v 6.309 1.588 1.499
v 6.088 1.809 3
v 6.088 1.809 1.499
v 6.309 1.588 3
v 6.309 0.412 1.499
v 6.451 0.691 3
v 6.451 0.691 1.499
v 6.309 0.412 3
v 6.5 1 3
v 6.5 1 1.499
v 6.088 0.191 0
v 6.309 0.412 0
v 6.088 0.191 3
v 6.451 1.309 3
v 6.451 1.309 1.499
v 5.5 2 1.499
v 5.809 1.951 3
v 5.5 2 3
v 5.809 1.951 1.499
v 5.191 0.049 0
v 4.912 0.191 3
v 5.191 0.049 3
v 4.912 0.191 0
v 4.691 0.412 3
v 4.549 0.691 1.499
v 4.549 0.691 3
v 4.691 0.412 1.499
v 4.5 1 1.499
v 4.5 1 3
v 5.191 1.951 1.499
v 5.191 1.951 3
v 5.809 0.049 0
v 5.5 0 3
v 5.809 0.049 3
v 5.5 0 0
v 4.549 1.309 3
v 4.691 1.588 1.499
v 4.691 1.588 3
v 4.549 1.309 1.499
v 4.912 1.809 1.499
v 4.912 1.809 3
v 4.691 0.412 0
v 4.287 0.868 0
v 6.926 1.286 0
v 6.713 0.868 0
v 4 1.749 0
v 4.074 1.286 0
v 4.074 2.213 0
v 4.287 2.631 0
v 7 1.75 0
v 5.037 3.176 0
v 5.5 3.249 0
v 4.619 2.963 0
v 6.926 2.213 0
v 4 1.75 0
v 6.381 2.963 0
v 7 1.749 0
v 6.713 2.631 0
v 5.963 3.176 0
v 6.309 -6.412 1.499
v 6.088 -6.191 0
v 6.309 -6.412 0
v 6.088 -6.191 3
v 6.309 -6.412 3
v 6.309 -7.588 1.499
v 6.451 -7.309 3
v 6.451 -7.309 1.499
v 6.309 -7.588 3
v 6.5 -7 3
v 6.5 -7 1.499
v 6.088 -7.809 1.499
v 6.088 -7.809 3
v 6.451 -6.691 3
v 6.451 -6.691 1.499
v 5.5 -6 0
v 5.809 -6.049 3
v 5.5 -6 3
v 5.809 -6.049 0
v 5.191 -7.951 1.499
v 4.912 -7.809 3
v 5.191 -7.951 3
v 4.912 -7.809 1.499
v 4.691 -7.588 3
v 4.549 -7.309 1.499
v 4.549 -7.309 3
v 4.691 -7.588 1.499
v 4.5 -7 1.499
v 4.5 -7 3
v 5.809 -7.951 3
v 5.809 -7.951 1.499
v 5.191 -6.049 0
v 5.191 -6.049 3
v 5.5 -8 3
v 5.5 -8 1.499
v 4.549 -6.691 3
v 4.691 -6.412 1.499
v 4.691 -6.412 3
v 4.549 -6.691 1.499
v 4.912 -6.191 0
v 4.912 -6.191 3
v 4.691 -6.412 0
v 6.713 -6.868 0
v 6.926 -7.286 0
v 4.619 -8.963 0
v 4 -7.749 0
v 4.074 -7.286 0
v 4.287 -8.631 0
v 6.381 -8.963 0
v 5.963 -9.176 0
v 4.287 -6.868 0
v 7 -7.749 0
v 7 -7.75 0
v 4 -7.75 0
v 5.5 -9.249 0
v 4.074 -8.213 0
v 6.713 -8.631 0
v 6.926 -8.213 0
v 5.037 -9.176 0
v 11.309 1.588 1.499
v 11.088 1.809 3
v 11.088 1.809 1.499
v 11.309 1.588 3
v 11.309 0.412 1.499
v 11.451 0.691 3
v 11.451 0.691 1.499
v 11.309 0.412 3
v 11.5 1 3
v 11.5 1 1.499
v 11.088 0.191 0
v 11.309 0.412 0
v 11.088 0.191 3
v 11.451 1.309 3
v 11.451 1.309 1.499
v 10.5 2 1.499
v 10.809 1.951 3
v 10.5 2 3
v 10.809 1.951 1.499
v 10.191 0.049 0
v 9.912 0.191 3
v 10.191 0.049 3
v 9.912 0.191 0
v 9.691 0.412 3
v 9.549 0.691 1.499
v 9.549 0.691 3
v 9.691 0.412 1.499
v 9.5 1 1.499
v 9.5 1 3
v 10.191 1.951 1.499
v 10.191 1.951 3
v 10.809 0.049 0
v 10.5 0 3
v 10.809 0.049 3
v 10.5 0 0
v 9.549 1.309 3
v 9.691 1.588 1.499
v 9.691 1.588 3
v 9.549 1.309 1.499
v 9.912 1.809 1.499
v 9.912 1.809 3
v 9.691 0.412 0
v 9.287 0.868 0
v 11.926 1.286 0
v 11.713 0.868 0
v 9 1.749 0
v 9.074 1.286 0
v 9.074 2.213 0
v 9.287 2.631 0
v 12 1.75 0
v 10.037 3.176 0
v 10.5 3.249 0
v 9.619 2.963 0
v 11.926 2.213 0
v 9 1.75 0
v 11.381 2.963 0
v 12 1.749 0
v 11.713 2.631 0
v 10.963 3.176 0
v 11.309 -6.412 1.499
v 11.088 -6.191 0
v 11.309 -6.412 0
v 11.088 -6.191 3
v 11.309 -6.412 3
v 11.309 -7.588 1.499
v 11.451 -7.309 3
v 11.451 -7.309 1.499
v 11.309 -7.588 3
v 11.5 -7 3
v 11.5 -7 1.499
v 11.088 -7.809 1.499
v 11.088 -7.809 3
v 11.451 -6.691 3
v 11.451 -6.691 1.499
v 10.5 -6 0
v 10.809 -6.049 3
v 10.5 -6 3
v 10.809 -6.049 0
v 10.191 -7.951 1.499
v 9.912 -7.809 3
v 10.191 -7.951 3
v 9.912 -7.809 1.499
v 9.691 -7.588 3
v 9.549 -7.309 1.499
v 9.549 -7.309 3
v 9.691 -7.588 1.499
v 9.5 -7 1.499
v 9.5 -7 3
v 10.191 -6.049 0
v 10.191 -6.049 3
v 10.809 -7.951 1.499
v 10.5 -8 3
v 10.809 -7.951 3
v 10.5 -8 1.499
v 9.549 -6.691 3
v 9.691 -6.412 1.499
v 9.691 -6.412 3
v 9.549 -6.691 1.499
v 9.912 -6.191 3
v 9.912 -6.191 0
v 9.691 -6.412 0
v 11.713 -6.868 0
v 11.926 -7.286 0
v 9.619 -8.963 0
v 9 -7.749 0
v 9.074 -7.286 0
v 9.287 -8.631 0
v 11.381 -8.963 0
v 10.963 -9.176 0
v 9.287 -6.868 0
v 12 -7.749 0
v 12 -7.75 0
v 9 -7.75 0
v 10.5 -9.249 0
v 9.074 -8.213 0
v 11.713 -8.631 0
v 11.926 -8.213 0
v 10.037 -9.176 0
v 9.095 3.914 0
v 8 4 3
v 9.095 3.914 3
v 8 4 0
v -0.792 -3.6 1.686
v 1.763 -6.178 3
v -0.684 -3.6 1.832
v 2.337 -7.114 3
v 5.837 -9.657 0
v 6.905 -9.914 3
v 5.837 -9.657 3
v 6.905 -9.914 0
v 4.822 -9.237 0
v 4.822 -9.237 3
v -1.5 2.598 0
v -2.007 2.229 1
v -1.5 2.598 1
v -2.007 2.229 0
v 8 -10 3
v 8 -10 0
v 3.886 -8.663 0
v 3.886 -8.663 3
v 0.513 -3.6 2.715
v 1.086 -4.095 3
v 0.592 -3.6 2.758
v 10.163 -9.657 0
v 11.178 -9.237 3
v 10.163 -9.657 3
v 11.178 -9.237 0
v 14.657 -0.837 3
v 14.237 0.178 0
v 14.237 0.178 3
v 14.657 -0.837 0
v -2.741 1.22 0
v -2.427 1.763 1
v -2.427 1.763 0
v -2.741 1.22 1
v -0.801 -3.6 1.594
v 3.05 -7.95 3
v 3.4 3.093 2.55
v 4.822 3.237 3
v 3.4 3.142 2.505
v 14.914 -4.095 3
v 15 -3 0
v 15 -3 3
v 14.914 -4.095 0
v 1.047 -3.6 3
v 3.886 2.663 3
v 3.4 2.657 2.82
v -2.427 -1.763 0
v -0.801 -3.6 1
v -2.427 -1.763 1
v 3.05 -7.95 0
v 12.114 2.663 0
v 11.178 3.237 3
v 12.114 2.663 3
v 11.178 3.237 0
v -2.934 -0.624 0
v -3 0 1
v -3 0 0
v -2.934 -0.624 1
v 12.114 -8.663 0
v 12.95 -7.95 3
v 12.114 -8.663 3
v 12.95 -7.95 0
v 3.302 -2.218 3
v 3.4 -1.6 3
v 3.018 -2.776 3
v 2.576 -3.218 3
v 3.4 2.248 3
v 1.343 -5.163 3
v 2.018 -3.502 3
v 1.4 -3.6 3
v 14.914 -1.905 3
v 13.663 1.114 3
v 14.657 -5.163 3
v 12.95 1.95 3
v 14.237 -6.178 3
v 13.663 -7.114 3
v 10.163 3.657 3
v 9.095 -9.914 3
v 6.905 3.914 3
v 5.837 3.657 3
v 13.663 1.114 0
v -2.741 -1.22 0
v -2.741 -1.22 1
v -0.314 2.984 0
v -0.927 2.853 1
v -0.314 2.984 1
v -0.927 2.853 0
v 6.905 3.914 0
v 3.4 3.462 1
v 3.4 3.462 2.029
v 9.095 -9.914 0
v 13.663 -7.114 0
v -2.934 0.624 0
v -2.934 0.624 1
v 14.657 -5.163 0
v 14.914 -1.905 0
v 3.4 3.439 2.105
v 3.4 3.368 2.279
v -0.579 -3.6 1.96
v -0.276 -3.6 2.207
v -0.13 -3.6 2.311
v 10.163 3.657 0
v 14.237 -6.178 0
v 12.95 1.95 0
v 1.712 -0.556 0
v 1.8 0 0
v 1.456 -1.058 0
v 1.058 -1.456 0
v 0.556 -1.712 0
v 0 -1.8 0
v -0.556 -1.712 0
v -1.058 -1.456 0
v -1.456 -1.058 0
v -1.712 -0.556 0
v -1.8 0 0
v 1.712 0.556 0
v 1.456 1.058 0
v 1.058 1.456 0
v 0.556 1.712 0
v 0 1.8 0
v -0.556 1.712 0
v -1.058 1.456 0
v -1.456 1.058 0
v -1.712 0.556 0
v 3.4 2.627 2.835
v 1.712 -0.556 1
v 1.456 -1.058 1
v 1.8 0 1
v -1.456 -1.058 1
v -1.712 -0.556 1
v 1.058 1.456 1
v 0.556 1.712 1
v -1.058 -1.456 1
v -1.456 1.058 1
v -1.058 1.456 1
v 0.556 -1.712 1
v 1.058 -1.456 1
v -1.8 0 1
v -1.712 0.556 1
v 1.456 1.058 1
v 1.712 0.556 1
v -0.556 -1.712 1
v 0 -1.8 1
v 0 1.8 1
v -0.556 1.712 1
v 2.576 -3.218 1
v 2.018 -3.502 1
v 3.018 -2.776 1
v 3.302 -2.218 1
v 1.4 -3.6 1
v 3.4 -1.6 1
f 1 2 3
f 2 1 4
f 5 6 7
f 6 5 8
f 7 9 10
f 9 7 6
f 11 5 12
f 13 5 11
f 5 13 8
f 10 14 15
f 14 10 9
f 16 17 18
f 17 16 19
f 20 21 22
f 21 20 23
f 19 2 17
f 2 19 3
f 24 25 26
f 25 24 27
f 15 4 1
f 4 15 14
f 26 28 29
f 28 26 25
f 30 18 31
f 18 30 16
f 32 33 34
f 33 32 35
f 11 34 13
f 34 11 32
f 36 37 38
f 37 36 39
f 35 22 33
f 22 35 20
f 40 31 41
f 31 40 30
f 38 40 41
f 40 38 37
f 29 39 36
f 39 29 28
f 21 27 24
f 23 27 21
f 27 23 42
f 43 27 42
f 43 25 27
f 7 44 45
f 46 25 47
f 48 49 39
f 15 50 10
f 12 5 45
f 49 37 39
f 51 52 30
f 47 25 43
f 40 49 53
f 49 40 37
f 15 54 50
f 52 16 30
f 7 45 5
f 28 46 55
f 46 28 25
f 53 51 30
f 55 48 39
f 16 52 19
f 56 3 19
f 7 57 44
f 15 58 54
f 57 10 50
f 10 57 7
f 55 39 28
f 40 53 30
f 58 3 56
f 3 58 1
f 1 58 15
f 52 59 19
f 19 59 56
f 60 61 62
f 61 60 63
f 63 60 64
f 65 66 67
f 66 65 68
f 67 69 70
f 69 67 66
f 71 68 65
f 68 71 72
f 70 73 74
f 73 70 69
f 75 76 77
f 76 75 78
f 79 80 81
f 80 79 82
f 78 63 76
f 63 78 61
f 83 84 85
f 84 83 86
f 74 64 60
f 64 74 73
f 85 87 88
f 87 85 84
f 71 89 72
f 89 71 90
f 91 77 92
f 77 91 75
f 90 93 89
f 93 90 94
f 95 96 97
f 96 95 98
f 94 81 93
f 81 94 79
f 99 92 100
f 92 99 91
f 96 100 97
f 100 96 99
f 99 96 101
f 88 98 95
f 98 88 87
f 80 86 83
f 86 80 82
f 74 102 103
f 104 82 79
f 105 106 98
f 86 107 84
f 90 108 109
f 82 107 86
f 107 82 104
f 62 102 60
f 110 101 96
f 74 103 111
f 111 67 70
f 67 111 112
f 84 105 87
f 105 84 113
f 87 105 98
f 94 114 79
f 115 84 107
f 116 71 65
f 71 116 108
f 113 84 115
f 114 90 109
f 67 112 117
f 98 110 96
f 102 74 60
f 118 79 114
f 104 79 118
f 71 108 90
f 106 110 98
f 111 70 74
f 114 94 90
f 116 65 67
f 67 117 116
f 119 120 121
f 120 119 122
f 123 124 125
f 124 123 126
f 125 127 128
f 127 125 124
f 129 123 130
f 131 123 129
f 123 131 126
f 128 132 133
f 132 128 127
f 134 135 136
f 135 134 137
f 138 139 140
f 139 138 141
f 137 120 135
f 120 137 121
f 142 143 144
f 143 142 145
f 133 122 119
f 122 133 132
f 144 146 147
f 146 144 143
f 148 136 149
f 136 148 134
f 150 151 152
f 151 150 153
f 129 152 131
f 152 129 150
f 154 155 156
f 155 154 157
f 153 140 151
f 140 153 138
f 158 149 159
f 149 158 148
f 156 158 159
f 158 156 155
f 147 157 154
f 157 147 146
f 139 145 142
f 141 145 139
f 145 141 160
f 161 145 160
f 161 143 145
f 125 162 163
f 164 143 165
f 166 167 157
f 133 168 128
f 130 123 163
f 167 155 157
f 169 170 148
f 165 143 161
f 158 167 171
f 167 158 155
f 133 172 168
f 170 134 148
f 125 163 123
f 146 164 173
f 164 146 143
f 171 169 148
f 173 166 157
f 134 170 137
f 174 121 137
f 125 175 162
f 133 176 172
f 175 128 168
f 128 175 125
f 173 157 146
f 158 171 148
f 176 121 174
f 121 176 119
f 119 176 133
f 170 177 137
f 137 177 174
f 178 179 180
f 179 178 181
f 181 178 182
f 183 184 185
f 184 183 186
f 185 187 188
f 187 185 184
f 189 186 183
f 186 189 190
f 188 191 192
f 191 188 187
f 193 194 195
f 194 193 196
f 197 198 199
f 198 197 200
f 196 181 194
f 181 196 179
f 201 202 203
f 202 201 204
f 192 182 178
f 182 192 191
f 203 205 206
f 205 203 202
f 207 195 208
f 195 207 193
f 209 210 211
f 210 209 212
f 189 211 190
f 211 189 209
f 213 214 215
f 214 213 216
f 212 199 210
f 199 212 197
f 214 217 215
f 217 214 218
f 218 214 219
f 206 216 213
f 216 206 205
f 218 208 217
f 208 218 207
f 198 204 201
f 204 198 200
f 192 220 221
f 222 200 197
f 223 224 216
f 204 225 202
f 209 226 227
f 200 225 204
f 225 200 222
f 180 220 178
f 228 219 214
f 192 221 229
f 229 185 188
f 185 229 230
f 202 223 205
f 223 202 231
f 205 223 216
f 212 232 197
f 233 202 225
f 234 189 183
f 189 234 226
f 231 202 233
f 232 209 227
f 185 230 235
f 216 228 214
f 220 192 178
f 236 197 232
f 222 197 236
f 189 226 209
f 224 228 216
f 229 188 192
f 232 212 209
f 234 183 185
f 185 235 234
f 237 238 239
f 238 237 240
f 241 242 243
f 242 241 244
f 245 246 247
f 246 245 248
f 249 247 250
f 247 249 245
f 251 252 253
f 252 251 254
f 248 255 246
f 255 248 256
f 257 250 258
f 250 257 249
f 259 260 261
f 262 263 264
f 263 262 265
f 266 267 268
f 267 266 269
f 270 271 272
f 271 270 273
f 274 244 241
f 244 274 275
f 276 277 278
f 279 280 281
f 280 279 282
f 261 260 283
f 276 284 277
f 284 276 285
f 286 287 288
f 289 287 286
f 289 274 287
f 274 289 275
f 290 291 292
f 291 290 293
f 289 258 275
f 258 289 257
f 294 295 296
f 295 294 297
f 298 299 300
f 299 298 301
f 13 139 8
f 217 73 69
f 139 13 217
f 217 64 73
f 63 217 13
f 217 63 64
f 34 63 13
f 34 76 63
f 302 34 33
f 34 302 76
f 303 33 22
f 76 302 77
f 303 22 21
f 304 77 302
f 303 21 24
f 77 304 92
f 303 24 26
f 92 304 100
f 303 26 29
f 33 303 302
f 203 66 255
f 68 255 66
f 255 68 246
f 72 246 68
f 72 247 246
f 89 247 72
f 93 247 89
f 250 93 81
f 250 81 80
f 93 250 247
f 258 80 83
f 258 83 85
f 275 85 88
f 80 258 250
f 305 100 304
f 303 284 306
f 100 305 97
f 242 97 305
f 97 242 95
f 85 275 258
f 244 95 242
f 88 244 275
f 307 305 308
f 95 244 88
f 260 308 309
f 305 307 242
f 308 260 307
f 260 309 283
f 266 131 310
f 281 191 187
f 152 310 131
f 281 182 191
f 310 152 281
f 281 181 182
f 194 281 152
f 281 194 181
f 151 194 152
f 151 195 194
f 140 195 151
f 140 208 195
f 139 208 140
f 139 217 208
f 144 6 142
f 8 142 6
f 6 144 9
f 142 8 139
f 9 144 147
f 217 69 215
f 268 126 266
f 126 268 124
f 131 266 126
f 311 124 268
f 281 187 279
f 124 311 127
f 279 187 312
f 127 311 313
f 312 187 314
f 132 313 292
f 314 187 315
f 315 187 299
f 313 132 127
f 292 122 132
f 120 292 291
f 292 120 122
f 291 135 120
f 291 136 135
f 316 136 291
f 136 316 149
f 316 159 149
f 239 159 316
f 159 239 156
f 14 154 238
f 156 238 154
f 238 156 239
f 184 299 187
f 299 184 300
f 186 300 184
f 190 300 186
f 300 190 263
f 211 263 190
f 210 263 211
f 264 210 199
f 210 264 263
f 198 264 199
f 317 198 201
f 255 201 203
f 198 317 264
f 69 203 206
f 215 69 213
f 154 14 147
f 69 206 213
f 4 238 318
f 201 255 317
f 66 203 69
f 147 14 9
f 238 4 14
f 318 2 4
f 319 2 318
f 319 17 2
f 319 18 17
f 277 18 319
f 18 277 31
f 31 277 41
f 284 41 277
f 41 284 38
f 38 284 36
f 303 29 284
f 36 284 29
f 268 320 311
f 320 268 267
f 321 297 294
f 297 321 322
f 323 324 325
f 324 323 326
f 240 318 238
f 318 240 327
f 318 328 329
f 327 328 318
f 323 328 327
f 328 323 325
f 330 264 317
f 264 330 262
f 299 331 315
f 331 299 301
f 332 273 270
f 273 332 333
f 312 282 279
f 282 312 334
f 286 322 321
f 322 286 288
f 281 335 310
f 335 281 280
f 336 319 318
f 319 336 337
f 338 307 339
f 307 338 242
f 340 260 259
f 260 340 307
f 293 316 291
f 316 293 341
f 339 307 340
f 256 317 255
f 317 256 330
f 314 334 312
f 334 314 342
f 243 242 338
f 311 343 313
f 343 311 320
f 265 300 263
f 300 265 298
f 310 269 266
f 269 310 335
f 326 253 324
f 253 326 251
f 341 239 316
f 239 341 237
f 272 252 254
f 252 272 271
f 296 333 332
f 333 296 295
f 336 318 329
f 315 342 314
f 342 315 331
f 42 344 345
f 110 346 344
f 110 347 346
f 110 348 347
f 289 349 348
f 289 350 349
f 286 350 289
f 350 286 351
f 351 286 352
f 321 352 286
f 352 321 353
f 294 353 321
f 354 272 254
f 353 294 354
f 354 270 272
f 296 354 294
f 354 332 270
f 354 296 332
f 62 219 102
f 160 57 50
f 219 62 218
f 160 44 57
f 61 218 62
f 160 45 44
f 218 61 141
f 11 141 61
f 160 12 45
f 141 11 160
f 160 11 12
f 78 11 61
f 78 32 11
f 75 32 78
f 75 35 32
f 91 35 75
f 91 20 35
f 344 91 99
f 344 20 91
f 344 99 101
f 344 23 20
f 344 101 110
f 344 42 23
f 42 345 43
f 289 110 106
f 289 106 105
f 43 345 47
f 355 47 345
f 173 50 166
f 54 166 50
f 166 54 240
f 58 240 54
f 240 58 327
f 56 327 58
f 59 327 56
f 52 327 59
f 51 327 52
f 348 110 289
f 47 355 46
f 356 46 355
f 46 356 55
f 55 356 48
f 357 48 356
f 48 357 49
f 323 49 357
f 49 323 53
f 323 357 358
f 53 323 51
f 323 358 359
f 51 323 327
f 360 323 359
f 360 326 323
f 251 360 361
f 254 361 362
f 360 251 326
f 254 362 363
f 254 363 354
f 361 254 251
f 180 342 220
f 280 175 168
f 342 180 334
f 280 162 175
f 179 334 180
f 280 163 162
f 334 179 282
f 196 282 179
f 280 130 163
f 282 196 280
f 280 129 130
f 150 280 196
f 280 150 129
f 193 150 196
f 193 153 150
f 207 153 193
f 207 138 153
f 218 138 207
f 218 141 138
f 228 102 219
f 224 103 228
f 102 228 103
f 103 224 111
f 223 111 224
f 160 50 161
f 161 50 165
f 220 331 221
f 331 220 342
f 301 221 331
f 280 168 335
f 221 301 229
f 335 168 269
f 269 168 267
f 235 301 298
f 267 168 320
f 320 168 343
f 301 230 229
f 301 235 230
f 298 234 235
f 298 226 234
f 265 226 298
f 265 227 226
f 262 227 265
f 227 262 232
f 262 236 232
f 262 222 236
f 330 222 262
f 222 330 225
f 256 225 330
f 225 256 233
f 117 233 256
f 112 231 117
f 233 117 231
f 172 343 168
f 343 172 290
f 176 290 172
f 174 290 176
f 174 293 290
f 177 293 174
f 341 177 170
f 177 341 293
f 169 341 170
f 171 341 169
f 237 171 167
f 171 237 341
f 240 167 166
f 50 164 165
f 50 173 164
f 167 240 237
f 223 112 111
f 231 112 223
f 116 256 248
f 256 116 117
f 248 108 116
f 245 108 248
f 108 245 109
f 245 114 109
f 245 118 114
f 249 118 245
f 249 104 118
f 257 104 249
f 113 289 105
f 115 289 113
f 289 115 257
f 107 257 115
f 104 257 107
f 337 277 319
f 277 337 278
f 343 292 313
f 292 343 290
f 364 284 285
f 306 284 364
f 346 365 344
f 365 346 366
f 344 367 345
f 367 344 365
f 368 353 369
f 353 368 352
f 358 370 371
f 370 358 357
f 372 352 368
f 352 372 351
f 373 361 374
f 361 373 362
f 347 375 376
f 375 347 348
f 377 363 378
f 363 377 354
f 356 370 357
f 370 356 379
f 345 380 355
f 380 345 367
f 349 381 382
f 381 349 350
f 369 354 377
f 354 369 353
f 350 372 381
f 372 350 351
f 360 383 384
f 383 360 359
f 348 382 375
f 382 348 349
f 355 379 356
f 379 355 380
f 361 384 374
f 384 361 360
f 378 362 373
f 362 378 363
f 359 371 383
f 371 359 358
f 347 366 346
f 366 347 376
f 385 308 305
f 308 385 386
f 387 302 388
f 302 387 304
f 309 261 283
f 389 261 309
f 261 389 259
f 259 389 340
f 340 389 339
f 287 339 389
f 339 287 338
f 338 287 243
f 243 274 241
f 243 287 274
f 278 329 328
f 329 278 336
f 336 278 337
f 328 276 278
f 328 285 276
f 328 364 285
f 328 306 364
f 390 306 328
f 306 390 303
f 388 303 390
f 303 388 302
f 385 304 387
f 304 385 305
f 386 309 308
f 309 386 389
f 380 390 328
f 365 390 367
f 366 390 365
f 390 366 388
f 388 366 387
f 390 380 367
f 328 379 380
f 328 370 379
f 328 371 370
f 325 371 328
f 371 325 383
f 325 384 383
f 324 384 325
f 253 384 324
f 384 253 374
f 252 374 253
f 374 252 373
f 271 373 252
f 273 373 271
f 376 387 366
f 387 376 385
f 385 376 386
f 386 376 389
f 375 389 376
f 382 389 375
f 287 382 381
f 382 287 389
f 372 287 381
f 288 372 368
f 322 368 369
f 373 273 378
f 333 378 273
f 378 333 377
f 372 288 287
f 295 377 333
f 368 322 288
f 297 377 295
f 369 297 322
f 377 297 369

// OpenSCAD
OFFSET = [8, 3, 0];

$fn=20;

module button_bracket () {
    difference () {
        hull () {
            cylinder (1, r=3, $fn=30);
            translate (OFFSET) cylinder (3, r=7, $fn=40);
        }
        translate ([0, 0, -1]) cylinder (10, r=1.8);
        hull () for (y=[0, -1]) for (x=[0, -1]) {
            translate ([x*10+1.4, y*10+1.6, 1]) cylinder (10, r=2);
        }
        for (x=[-1, 1]) for (y=[-1, 1]) translate (OFFSET+[x*5/2, y*8/2, -0.001]) {
            cylinder (10, r=1);
            hull () {
                cylinder (1.5, r=1);
                translate ([0, y*.75, 0]) cylinder (1.25, r1=1.5, r2=0);
            }
        }
    }
}

scale ([1,-1,1]) button_bracket();
